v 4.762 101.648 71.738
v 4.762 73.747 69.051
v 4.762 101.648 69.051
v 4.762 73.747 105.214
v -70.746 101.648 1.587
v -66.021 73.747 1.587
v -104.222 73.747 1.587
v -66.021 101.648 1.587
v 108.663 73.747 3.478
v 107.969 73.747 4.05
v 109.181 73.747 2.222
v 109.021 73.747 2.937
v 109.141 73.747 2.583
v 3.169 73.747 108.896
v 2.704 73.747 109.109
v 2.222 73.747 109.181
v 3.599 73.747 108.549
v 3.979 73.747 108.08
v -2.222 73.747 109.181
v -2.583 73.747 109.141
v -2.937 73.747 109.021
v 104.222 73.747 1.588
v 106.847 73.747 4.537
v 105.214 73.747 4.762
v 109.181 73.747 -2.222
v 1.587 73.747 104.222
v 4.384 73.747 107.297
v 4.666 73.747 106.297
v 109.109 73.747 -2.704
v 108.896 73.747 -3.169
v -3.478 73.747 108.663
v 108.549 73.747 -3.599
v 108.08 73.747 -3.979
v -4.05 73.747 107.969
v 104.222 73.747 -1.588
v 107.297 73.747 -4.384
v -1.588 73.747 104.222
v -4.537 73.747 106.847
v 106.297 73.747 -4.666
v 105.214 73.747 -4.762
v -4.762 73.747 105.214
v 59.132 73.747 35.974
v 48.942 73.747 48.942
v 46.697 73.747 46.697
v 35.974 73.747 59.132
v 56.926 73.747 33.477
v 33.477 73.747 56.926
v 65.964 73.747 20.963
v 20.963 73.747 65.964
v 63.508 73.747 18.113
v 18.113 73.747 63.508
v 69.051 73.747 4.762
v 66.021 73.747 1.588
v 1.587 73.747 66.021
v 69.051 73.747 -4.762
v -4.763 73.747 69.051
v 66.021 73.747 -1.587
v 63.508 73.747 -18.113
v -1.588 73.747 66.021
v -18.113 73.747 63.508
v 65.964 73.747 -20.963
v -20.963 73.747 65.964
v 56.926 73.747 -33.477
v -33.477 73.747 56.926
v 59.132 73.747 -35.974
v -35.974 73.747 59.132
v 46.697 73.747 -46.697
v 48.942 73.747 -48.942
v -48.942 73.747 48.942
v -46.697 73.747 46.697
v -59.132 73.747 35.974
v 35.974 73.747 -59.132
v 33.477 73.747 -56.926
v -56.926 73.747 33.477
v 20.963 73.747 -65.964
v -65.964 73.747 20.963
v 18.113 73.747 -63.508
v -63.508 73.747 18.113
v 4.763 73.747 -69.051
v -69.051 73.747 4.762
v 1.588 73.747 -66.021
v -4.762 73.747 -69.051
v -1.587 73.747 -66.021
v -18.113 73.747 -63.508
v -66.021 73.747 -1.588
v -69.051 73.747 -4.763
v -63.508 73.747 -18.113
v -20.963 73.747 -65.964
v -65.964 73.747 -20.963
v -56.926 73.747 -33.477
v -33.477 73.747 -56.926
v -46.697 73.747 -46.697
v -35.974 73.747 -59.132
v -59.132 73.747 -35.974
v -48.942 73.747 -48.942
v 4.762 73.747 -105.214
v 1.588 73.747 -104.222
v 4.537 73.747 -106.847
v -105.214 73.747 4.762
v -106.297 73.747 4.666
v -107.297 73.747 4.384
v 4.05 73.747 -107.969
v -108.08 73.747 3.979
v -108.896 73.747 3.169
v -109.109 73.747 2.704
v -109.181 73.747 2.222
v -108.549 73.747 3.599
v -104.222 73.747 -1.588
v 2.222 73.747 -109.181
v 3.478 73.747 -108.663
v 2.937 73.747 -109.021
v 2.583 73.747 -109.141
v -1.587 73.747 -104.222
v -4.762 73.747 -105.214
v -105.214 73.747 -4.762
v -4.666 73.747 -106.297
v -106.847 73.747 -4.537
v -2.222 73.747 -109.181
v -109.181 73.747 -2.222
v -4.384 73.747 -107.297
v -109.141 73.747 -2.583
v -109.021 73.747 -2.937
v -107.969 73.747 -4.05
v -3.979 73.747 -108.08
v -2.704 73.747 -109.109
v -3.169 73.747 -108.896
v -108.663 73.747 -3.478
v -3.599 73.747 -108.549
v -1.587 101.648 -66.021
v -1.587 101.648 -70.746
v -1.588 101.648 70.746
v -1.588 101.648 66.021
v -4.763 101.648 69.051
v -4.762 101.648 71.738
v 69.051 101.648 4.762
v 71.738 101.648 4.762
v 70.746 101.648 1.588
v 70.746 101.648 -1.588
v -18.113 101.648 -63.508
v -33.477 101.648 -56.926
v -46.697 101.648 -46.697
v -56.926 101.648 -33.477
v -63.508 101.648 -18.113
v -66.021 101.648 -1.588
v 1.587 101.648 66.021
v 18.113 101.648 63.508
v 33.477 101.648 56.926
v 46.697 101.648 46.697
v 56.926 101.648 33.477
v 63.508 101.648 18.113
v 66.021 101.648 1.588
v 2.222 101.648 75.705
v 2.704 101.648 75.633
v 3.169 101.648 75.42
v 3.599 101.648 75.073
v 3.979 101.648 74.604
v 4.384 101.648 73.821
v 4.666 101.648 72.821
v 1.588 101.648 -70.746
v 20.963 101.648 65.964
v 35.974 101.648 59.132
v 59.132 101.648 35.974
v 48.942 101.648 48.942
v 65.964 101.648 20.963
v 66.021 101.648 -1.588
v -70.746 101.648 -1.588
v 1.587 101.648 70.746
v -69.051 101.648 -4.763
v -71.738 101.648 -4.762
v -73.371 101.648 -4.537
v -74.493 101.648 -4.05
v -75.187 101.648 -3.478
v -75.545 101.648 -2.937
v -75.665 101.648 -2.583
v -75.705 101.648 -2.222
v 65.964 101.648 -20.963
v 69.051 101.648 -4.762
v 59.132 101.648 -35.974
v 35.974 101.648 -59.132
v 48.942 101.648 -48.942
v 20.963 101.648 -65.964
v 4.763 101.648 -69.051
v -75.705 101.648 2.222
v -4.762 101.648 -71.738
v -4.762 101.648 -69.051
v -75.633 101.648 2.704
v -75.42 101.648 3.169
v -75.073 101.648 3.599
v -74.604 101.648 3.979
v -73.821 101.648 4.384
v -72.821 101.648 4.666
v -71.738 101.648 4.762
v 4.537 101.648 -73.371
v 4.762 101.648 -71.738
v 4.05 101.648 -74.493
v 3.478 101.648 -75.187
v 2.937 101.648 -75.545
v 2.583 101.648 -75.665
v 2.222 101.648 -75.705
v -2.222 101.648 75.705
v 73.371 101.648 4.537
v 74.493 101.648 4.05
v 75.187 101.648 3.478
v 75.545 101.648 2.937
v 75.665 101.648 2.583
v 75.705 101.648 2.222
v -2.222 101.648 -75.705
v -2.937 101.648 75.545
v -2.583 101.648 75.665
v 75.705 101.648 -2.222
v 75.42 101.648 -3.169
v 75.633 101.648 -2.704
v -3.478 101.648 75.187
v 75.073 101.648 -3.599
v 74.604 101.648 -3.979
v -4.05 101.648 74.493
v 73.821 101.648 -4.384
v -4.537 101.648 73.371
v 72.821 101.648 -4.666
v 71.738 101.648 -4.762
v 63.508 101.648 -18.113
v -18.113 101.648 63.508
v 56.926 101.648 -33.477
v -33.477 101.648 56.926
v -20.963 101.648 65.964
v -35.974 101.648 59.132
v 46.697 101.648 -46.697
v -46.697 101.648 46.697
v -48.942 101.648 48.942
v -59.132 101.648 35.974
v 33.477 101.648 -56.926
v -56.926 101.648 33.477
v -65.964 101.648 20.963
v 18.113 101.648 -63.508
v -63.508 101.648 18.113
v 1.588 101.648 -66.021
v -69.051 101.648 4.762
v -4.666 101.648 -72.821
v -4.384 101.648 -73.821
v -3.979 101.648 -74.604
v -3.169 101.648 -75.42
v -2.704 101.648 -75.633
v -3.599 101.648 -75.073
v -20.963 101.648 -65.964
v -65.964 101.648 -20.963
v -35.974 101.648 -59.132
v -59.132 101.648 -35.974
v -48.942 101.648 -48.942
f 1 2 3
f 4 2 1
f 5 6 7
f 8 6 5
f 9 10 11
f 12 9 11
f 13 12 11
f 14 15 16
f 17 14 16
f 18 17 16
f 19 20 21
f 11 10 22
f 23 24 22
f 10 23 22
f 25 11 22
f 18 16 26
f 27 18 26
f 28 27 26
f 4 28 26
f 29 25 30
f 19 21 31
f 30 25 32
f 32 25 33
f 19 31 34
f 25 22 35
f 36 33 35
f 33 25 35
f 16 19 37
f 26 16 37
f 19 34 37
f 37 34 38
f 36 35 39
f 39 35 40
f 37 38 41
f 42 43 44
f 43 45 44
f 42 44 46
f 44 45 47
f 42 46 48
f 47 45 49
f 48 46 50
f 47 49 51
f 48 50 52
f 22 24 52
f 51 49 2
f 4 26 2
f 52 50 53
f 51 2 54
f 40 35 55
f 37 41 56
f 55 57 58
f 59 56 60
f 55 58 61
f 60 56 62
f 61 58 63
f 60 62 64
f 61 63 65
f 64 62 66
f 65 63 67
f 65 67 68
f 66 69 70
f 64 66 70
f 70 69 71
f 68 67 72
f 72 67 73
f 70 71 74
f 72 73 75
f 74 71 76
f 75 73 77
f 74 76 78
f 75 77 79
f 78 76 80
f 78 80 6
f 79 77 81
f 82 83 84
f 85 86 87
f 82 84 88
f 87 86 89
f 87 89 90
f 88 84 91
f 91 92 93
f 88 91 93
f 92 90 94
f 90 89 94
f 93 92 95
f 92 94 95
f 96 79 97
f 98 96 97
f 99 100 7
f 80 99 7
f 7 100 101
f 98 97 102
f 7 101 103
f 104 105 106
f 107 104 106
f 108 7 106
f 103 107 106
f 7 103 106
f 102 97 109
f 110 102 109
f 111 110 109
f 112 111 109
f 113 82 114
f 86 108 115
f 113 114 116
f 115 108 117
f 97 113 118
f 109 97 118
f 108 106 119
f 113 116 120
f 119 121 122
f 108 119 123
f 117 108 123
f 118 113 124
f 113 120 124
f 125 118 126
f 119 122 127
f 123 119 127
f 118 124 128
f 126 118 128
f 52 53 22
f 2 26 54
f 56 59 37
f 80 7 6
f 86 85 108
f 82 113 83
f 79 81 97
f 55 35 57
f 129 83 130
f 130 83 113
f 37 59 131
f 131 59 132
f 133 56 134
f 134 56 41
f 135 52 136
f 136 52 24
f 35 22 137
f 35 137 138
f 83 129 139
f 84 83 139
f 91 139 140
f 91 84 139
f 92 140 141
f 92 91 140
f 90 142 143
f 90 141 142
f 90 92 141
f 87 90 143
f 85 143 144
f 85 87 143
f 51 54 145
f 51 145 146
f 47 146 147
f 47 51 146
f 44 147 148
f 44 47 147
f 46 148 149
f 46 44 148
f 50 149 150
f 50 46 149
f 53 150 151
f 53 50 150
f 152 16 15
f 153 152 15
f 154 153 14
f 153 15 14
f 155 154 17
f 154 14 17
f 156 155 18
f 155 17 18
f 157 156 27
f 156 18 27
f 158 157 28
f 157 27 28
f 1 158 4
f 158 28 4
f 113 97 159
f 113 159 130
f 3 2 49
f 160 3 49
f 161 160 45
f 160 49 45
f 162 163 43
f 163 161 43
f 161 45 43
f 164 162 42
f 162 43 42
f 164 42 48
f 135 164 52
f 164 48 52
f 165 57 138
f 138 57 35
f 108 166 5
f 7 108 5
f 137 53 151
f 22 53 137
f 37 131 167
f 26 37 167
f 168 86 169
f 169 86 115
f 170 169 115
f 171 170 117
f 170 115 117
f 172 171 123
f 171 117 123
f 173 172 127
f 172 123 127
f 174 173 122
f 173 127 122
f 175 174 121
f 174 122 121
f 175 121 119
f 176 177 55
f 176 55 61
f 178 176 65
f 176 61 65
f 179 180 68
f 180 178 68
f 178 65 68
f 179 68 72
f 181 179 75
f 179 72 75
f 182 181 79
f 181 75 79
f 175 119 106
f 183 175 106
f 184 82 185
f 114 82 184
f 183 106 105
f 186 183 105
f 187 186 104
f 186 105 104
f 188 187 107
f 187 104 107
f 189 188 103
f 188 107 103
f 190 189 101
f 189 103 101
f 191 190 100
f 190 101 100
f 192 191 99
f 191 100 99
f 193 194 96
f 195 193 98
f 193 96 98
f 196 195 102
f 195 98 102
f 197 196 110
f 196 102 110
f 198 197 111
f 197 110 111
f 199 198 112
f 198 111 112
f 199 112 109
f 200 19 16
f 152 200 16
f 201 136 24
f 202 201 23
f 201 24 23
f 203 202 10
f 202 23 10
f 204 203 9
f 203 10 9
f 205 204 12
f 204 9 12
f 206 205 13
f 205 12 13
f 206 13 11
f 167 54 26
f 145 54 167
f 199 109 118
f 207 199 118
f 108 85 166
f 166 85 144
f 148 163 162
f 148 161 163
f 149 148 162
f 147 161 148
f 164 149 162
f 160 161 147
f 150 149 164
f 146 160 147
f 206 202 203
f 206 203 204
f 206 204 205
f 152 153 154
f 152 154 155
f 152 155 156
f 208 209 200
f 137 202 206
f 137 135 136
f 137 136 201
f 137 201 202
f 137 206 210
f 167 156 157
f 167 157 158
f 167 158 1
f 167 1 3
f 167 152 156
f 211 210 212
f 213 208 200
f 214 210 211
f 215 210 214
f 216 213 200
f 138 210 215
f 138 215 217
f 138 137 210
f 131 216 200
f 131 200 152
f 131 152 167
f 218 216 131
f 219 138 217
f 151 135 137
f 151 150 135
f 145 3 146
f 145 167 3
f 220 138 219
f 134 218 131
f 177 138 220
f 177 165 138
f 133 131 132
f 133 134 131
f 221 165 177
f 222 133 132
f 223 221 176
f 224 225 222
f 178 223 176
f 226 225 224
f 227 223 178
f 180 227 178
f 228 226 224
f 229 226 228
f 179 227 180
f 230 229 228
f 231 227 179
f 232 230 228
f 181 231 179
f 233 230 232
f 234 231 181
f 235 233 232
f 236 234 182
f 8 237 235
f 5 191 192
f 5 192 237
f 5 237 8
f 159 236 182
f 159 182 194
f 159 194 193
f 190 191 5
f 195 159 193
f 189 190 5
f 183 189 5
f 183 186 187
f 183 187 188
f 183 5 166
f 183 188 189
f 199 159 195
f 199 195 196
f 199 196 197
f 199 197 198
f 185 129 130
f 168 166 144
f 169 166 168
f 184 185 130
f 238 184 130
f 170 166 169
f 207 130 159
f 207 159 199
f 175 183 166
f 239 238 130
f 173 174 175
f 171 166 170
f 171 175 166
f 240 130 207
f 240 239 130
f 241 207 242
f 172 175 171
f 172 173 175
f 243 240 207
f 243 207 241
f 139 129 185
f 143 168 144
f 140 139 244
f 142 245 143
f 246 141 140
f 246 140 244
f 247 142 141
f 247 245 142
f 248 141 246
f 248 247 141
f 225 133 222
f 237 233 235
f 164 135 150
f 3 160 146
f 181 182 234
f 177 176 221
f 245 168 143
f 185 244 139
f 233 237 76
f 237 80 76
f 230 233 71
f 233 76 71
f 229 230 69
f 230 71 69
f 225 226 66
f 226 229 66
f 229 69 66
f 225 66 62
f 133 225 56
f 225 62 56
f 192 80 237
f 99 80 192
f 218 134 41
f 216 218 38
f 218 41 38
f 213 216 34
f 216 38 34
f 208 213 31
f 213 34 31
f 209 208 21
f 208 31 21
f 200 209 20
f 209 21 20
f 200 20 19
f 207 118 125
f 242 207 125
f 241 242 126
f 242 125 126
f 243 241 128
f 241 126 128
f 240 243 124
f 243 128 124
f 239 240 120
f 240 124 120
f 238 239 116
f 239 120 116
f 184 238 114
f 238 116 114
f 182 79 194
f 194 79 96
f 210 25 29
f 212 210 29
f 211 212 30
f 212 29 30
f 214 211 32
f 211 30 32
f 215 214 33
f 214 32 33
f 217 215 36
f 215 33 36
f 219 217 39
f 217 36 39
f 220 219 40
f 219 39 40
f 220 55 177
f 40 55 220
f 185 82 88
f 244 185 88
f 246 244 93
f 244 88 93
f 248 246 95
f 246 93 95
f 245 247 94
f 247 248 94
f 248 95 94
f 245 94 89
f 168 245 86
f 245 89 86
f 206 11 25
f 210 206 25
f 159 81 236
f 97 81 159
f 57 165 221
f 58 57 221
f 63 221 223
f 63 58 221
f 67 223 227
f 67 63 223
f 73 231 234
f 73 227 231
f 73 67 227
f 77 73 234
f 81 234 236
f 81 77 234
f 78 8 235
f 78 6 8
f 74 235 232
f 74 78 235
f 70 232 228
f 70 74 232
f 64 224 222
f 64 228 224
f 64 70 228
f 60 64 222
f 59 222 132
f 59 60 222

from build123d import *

# Parameters (mm, degrees)
SKETCH4_R                      = 69.215
SKETCH4_R_2                    = 66.04
BOSS_EXTRUDE3_DEPTH            = 114.3
CUT_EXTRUDE3_REACH             = 152.486
CUT_EXTRUDE3_END_RADIUS        = 69.215
SKETCH11_W                     = 3.175
SKETCH11_H                     = 203.2
CUT_EXTRUDE3_DIRECTION_2_DEPTH = 151.485622071
CUT_EXTRUDE4_REACH             = 152.486
CUT_EXTRUDE4_END_RADIUS        = 69.215
SKETCH12_W                     = 3.175
SKETCH12_H                     = 203.2
CUT_EXTRUDE5_REACH             = 152.486
CUT_EXTRUDE5_END_RADIUS        = 69.215
SKETCH13_W                     = 3.175
SKETCH13_H                     = 203.2
BOSS_EXTRUDE4_REACH            = 184.577
BOSS_EXTRUDE4_END_RADIUS       = 69.215
SKETCH17_W                     = 9.525
SKETCH17_H                     = 62.726737768
CUT_EXTRUDE6_REACH             = 184.577
CUT_EXTRUDE6_END_RADIUS        = 66.04
SKETCH19_W                     = 3.175
SKETCH19_H                     = 59.551737768
CIRPATTERN1_COUNT              = 4
FILLET2_R                      = 2.54
CUT_EXTRUDE9_DEPTH             = 193.329009636
CUT_EXTRUDE9_DEPTH_BACK        = 193.329009636
SKETCH21_W                     = 275.590003483
SKETCH21_H                     = 18.263028837
SKETCH21_H_2                   = 74.818808086


with BuildPart() as part:
    # Sketch4 → Boss-Extrude3 (new body)
    with BuildSketch(Plane(origin=(0, 0, 0), x_dir=(1, 0, 0), z_dir=(0, 1, 0))):
        with Locations(Location((0, 0, 0), (0, 0, 270))):
            Circle(SKETCH4_R)
        with Locations(Location((0, 0, 0), (0, 0, 270))):
            Circle(SKETCH4_R_2, mode=Mode.SUBTRACT)
    extrude(amount=BOSS_EXTRUDE3_DEPTH)

    # Cut-Extrude3: up to this cylinder (the profile starts inside it)
    cut_extrude3_end = Plane(origin=(0, 0, 0), z_dir=(0, -1, 0)) * Cylinder(CUT_EXTRUDE3_END_RADIUS, 444.402, mode=Mode.PRIVATE)
    # Sketch11 → Cut-Extrude3 (cut, up to the surface)
    with BuildSketch(Plane.XY, mode=Mode.PRIVATE) as cut_extrude3_sk1:
        Rectangle(SKETCH11_W, SKETCH11_H)
    cut_extrude3_tool1 = extrude(cut_extrude3_sk1.sketch, amount=-CUT_EXTRUDE3_REACH, mode=Mode.PRIVATE) & cut_extrude3_end
    add(cut_extrude3_tool1.solids().sort_by_distance((0, 0, 0))[0], mode=Mode.SUBTRACT)

    # Sketch11 → Cut-Extrude3 direction 2 (cut)
    with BuildSketch(Plane.XY):
        Rectangle(SKETCH11_W, SKETCH11_H)
    extrude(amount=CUT_EXTRUDE3_DIRECTION_2_DEPTH, mode=Mode.SUBTRACT)

    # Cut-Extrude4: up to this cylinder (the profile starts inside it)
    cut_extrude4_end = Plane(origin=(0, 0, 0), z_dir=(0, -1, 0)) * Cylinder(CUT_EXTRUDE4_END_RADIUS, 444.402, mode=Mode.PRIVATE)
    # Sketch12 → Cut-Extrude4 (cut, up to the surface)
    with BuildSketch(Plane(origin=(0, 0, 0), x_dir=(0, 0, -1), z_dir=(1, 0, 0)), mode=Mode.PRIVATE) as cut_extrude4_sk1:
        Rectangle(SKETCH12_W, SKETCH12_H)
    cut_extrude4_tool1 = extrude(cut_extrude4_sk1.sketch, amount=-CUT_EXTRUDE4_REACH, mode=Mode.PRIVATE) & cut_extrude4_end
    add(cut_extrude4_tool1.solids().sort_by_distance((0, 0, 0))[0], mode=Mode.SUBTRACT)

    # Cut-Extrude5: up to this cylinder (the profile starts inside it)
    cut_extrude5_end = Plane(origin=(0, 0, 0), z_dir=(0, -1, 0)) * Cylinder(CUT_EXTRUDE5_END_RADIUS, 444.402, mode=Mode.PRIVATE)
    # Sketch13 → Cut-Extrude5 (cut, up to the surface)
    with BuildSketch(Plane(origin=(0, 0, 0), x_dir=(0, 0, -1), z_dir=(1, 0, 0)), mode=Mode.PRIVATE) as cut_extrude5_sk1:
        Rectangle(SKETCH13_W, SKETCH13_H)
    cut_extrude5_tool1 = extrude(cut_extrude5_sk1.sketch, amount=CUT_EXTRUDE5_REACH, mode=Mode.PRIVATE) & cut_extrude5_end
    add(cut_extrude5_tool1.solids().sort_by_distance((0, 0, 0))[0], mode=Mode.SUBTRACT)

    # Boss-Extrude4: up to this cylinder (the profile starts outside it)
    boss_extrude4_end = Plane(origin=(0, 49.492455, 0), z_dir=(0, -1, 0)) * Cylinder(BOSS_EXTRUDE4_END_RADIUS, 508.584, mode=Mode.PRIVATE)
    # Sketch17 → Boss-Extrude4 (add, up to the surface)
    with BuildSketch(Plane(origin=(28.35077692, -23.629361026, 0), x_dir=(0, 0, -1), z_dir=(0.7681717916741627, -0.6402437805056029, 0)), mode=Mode.PRIVATE) as boss_extrude4_sk1:
        with Locations((0, 95.18940566)):
            Rectangle(SKETCH17_W, SKETCH17_H)
    boss_extrude4_tool1 = extrude(boss_extrude4_sk1.sketch, amount=-BOSS_EXTRUDE4_REACH, mode=Mode.PRIVATE) - boss_extrude4_end
    boss_extrude4 = boss_extrude4_tool1.solids().sort_by_distance((89.295202, 49.492455, 0))[0]
    add(boss_extrude4)

    # Cut-Extrude6: up to this cylinder (the profile starts outside it)
    cut_extrude6_end = Plane(origin=(0, 48.272983, 0), z_dir=(0, -1, 0)) * Cylinder(CUT_EXTRUDE6_END_RADIUS, 502.234, mode=Mode.PRIVATE)
    # Sketch19 → Cut-Extrude6 (cut, up to the surface)
    with BuildSketch(Plane(origin=(28.35077692, -23.629361026, 0), x_dir=(0, 0, -1), z_dir=(0.7681717916741628, -0.640243780505603, 0)), mode=Mode.PRIVATE) as cut_extrude6_sk1:
        with Locations((0, 93.60190566)):
            Rectangle(SKETCH19_W, SKETCH19_H)
    cut_extrude6_tool1 = extrude(cut_extrude6_sk1.sketch, amount=-CUT_EXTRUDE6_REACH, mode=Mode.PRIVATE) - cut_extrude6_end
    cut_extrude6 = cut_extrude6_tool1.solids().sort_by_distance((88.278815, 48.272983, 0))[0]
    add(cut_extrude6, mode=Mode.SUBTRACT)

    # CirPattern1: Boss-Extrude4, Cut-Extrude6 ×4 about axis
    cirpattern1_axis = Axis((0, 0, 0), (0, 1, 0))
    add([boss_extrude4.rotate(cirpattern1_axis, i * 360 / CIRPATTERN1_COUNT) for i in range(1, CIRPATTERN1_COUNT)])
    add([cut_extrude6.rotate(cirpattern1_axis, i * 360 / CIRPATTERN1_COUNT) for i in range(1, CIRPATTERN1_COUNT)], mode=Mode.SUBTRACT)

    # Fillet2
    # the kernel refuses this fillet: 2.54 mm, written as the material it takes off along each edge
    with BuildSketch(Plane(origin=(4.7625, 20.522109123, -65.149451994), x_dir=(-1, 0, 0), z_dir=(0, 0.7681717916741628, -0.640243780505603))) as fillet2_piece_1_section:
        with BuildLine():
            CenterArc((FILLET2_R, FILLET2_R), FILLET2_R, 180, 90)
            Line((0, FILLET2_R), (0, 0))
            Line((0, 0), (FILLET2_R, 0))
        make_face()
    fillet2_piece_1 = extrude(amount=75.426737768, mode=Mode.PRIVATE)
    fillet2_piece_1 = fillet2_piece_1 - Plane(origin=(0, 52.481761508, 0), x_dir=(0, 0, 1), z_dir=(0, -1, 0)) * Cylinder(69.215, 162, mode=Mode.PRIVATE)
    add(fillet2_piece_1, mode=Mode.SUBTRACT)
    with BuildSketch(Plane(origin=(4.7625, 69.519362531, -114.253294604), x_dir=(0, -0.7681717916741627, 0.640243780505603), z_dir=(0, 0.640243780505603, 0.7681717916741628))) as fillet2_piece_2_section:
        with BuildLine():
            CenterArc((FILLET2_R, -FILLET2_R), FILLET2_R, 90, 90)
            Line((0, -FILLET2_R), (0, 0))
            Line((0, 0), (FILLET2_R, 0))
        make_face()
    fillet2_piece_2 = extrude(amount=65.194046298, mode=Mode.PRIVATE)
    fillet2_piece_2 = fillet2_piece_2 - Plane(origin=(0, 87.751002434, 0), x_dir=(0, 0, 1), z_dir=(0, -1, 0)) * Cylinder(69.215, 141, mode=Mode.PRIVATE)
    add(fillet2_piece_2, mode=Mode.SUBTRACT)
    with BuildSketch(Plane(origin=(-4.7625, 78.462801414, -113.440951733), x_dir=(1, 0, 0), z_dir=(0, -0.7681717916741628, 0.640243780505603))) as fillet2_piece_3_section:
        with BuildLine():
            CenterArc((FILLET2_R, FILLET2_R), FILLET2_R, 180, 90)
            Line((0, FILLET2_R), (0, 0))
            Line((0, 0), (FILLET2_R, 0))
        make_face()
    fillet2_piece_3 = extrude(amount=75.426737768, mode=Mode.PRIVATE)
    fillet2_piece_3 = fillet2_piece_3 - Plane(origin=(0, 52.481717746, 0), x_dir=(0, 0, 1), z_dir=(0, -1, 0)) * Cylinder(69.215, 162, mode=Mode.PRIVATE)
    add(fillet2_piece_3, mode=Mode.SUBTRACT)
    with BuildSketch(Plane(origin=(-4.7625, 69.519362531, -114.253294604), x_dir=(1, 0, 0), z_dir=(0, 0.640243780505603, 0.7681717916741628))) as fillet2_piece_4_section:
        with BuildLine():
            CenterArc((FILLET2_R, -FILLET2_R), FILLET2_R, 90, 90)
            Line((0, -FILLET2_R), (0, 0))
            Line((0, 0), (FILLET2_R, 0))
        make_face()
    fillet2_piece_4 = extrude(amount=65.194046298, mode=Mode.PRIVATE)
    fillet2_piece_4 = fillet2_piece_4 - Plane(origin=(0, 87.75098251, 0), x_dir=(0, 0, 1), z_dir=(0, -1, 0)) * Cylinder(69.215, 141, mode=Mode.PRIVATE)
    add(fillet2_piece_4, mode=Mode.SUBTRACT)
    with BuildSketch(Plane(origin=(-113.440951733, 78.462801414, 4.7625), x_dir=(0.7681717916741627, 0.640243780505603, 0), z_dir=(0.640243780505603, -0.7681717916741628, 0))) as fillet2_piece_5_section:
        with BuildLine():
            CenterArc((FILLET2_R, -FILLET2_R), FILLET2_R, 90, 90)
            Line((0, -FILLET2_R), (0, 0))
            Line((0, 0), (FILLET2_R, 0))
        make_face()
    fillet2_piece_5 = extrude(amount=75.426737768, mode=Mode.PRIVATE)
    fillet2_piece_5 = fillet2_piece_5 - Plane(origin=(0, 52.481803849, 0), x_dir=(0, 0, 1), z_dir=(0, -1, 0)) * Cylinder(69.215, 162, mode=Mode.PRIVATE)
    add(fillet2_piece_5, mode=Mode.SUBTRACT)
    with BuildSketch(Plane(origin=(-65.149451994, 20.522109123, -4.7625), x_dir=(0.7681717916741627, 0.6402437805056029, 0), z_dir=(-0.640243780505603, 0.7681717916741628, 0))) as fillet2_piece_6_section:
        with BuildLine():
            CenterArc((FILLET2_R, -FILLET2_R), FILLET2_R, 90, 90)
            Line((0, -FILLET2_R), (0, 0))
            Line((0, 0), (FILLET2_R, 0))
        make_face()
    fillet2_piece_6 = extrude(amount=75.426737768, mode=Mode.PRIVATE)
    fillet2_piece_6 = fillet2_piece_6 - Plane(origin=(0, 52.481712427, 0), x_dir=(0, 0, 1), z_dir=(0, -1, 0)) * Cylinder(69.215, 162, mode=Mode.PRIVATE)
    add(fillet2_piece_6, mode=Mode.SUBTRACT)
    with BuildSketch(Plane(origin=(-114.253294604, 69.519362531, -4.7625), x_dir=(0.640243780505603, -0.7681717916741627, 0), z_dir=(0.7681717916741628, 0.640243780505603, 0))) as fillet2_piece_7_section:
        with BuildLine():
            CenterArc((FILLET2_R, -FILLET2_R), FILLET2_R, 90, 90)
            Line((0, -FILLET2_R), (0, 0))
            Line((0, 0), (FILLET2_R, 0))
        make_face()
    fillet2_piece_7 = extrude(amount=65.194046298, mode=Mode.PRIVATE)
    fillet2_piece_7 = fillet2_piece_7 - Plane(origin=(0, 87.75099738, 0), x_dir=(0, 0, 1), z_dir=(0, -1, 0)) * Cylinder(69.215, 141, mode=Mode.PRIVATE)
    add(fillet2_piece_7, mode=Mode.SUBTRACT)
    with BuildSketch(Plane(origin=(-114.253294604, 69.519362531, 4.7625), x_dir=(0, 0, -1), z_dir=(0.7681717916741628, 0.640243780505603, 0))) as fillet2_piece_8_section:
        with BuildLine():
            CenterArc((FILLET2_R, -FILLET2_R), FILLET2_R, 90, 90)
            Line((0, -FILLET2_R), (0, 0))
            Line((0, 0), (FILLET2_R, 0))
        make_face()
    fillet2_piece_8 = extrude(amount=65.194046298, mode=Mode.PRIVATE)
    fillet2_piece_8 = fillet2_piece_8 - Plane(origin=(0, 87.75098251, 0), x_dir=(0, 0, 1), z_dir=(0, -1, 0)) * Cylinder(69.215, 141, mode=Mode.PRIVATE)
    add(fillet2_piece_8, mode=Mode.SUBTRACT)
    with BuildSketch(Plane(origin=(4.7625, 78.462801414, 113.440951733), x_dir=(0, 0.640243780505603, -0.7681717916741628), z_dir=(0, -0.7681717916741628, -0.640243780505603))) as fillet2_piece_9_section:
        with BuildLine():
            CenterArc((FILLET2_R, -FILLET2_R), FILLET2_R, 90, 90)
            Line((0, -FILLET2_R), (0, 0))
            Line((0, 0), (FILLET2_R, 0))
        make_face()
    fillet2_piece_9 = extrude(amount=75.426737768, mode=Mode.PRIVATE)
    fillet2_piece_9 = fillet2_piece_9 - Plane(origin=(0, 52.48180385, 0), x_dir=(0, 0, 1), z_dir=(0, -1, 0)) * Cylinder(69.215, 162, mode=Mode.PRIVATE)
    add(fillet2_piece_9, mode=Mode.SUBTRACT)
    with BuildSketch(Plane(origin=(-4.7625, 20.522109123, 65.149451994), x_dir=(0, 0.640243780505603, -0.7681717916741628), z_dir=(0, 0.7681717916741628, 0.640243780505603))) as fillet2_piece_10_section:
        with BuildLine():
            CenterArc((FILLET2_R, -FILLET2_R), FILLET2_R, 90, 90)
            Line((0, -FILLET2_R), (0, 0))
            Line((0, 0), (FILLET2_R, 0))
        make_face()
    fillet2_piece_10 = extrude(amount=75.426737768, mode=Mode.PRIVATE)
    fillet2_piece_10 = fillet2_piece_10 - Plane(origin=(0, 52.481712427, 0), x_dir=(0, 0, 1), z_dir=(0, -1, 0)) * Cylinder(69.215, 162, mode=Mode.PRIVATE)
    add(fillet2_piece_10, mode=Mode.SUBTRACT)
    with BuildSketch(Plane(origin=(-4.7625, 69.519362531, 114.253294604), x_dir=(0, -0.7681717916741627, -0.640243780505603), z_dir=(0, 0.640243780505603, -0.7681717916741628))) as fillet2_piece_11_section:
        with BuildLine():
            CenterArc((FILLET2_R, -FILLET2_R), FILLET2_R, 90, 90)
            Line((0, -FILLET2_R), (0, 0))
            Line((0, 0), (FILLET2_R, 0))
        make_face()
    fillet2_piece_11 = extrude(amount=65.194046298, mode=Mode.PRIVATE)
    fillet2_piece_11 = fillet2_piece_11 - Plane(origin=(0, 87.750997379, 0), x_dir=(0, 0, 1), z_dir=(0, -1, 0)) * Cylinder(69.215, 141, mode=Mode.PRIVATE)
    add(fillet2_piece_11, mode=Mode.SUBTRACT)
    with BuildSketch(Plane(origin=(4.7625, 69.519362531, 114.253294604), x_dir=(-1, 0, 0), z_dir=(0, 0.640243780505603, -0.7681717916741628))) as fillet2_piece_12_section:
        with BuildLine():
            CenterArc((FILLET2_R, -FILLET2_R), FILLET2_R, 90, 90)
            Line((0, -FILLET2_R), (0, 0))
            Line((0, 0), (FILLET2_R, 0))
        make_face()
    fillet2_piece_12 = extrude(amount=65.194046298, mode=Mode.PRIVATE)
    fillet2_piece_12 = fillet2_piece_12 - Plane(origin=(0, 87.750982502, 0), x_dir=(0, 0, 1), z_dir=(0, -1, 0)) * Cylinder(69.215, 141, mode=Mode.PRIVATE)
    add(fillet2_piece_12, mode=Mode.SUBTRACT)
    with BuildSketch(Plane(origin=(114.253294604, 69.519362531, -4.7625), x_dir=(-0.6402437805056029, -0.7681717916741627, 0), z_dir=(-0.7681717916741628, 0.640243780505603, 0))) as fillet2_piece_13_section:
        with BuildLine():
            CenterArc((FILLET2_R, FILLET2_R), FILLET2_R, 180, 90)
            Line((0, FILLET2_R), (0, 0))
            Line((0, 0), (FILLET2_R, 0))
        make_face()
    fillet2_piece_13 = extrude(amount=65.194046298, mode=Mode.PRIVATE)
    fillet2_piece_13 = fillet2_piece_13 - Plane(origin=(0, 87.750998227, 0), x_dir=(0, 0, 1), z_dir=(0, -1, 0)) * Cylinder(69.215, 141, mode=Mode.PRIVATE)
    add(fillet2_piece_13, mode=Mode.SUBTRACT)
    with BuildSketch(Plane(origin=(114.253294604, 69.519362531, 4.7625), x_dir=(0, 0, -1), z_dir=(-0.7681717916741628, 0.640243780505603, 0))) as fillet2_piece_14_section:
        with BuildLine():
            CenterArc((FILLET2_R, FILLET2_R), FILLET2_R, 180, 90)
            Line((0, FILLET2_R), (0, 0))
            Line((0, 0), (FILLET2_R, 0))
        make_face()
    fillet2_piece_14 = extrude(amount=65.194046298, mode=Mode.PRIVATE)
    fillet2_piece_14 = fillet2_piece_14 - Plane(origin=(0, 87.7510067, 0), x_dir=(0, 0, 1), z_dir=(0, -1, 0)) * Cylinder(69.215, 141, mode=Mode.PRIVATE)
    add(fillet2_piece_14, mode=Mode.SUBTRACT)
    with BuildSketch(Plane(origin=(65.149451994, 20.522109123, 4.7625), x_dir=(-0.7681717916741627, 0.6402437805056029, 0), z_dir=(0.640243780505603, 0.7681717916741628, 0))) as fillet2_piece_15_section:
        with BuildLine():
            CenterArc((FILLET2_R, -FILLET2_R), FILLET2_R, 90, 90)
            Line((0, -FILLET2_R), (0, 0))
            Line((0, 0), (FILLET2_R, 0))
        make_face()
    fillet2_piece_15 = extrude(amount=75.426737768, mode=Mode.PRIVATE)
    fillet2_piece_15 = fillet2_piece_15 - Plane(origin=(0, 52.481781271, 0), x_dir=(0, 0, 1), z_dir=(0, -1, 0)) * Cylinder(69.215, 162, mode=Mode.PRIVATE)
    add(fillet2_piece_15, mode=Mode.SUBTRACT)
    with BuildSketch(Plane(origin=(113.440951733, 78.462801414, -4.7625), x_dir=(-0.7681717916741627, 0.640243780505603, 0), z_dir=(-0.640243780505603, -0.7681717916741628, 0))) as fillet2_piece_16_section:
        with BuildLine():
            CenterArc((FILLET2_R, -FILLET2_R), FILLET2_R, 90, 90)
            Line((0, -FILLET2_R), (0, 0))
            Line((0, 0), (FILLET2_R, 0))
        make_face()
    fillet2_piece_16 = extrude(amount=75.426737768, mode=Mode.PRIVATE)
    fillet2_piece_16 = fillet2_piece_16 - Plane(origin=(0, 52.481835587, 0), x_dir=(0, 0, 1), z_dir=(0, -1, 0)) * Cylinder(69.215, 162, mode=Mode.PRIVATE)
    add(fillet2_piece_16, mode=Mode.SUBTRACT)

    # Sketch21 → Cut-Extrude9 (cut, two sides: drawn at the far end of the back side and taken through both)
    with BuildSketch(Plane(origin=(0, 0, 0), x_dir=(0, 0, -1), z_dir=(1, 0, 0)).offset(-CUT_EXTRUDE9_DEPTH_BACK)):
        with Locations((2.764773941, 110.779336526)):
            Rectangle(SKETCH21_W, SKETCH21_H)
        with Locations((2.764773941, 36.337367755)):
            Rectangle(SKETCH21_W, SKETCH21_H_2)
    extrude(amount=CUT_EXTRUDE9_DEPTH + CUT_EXTRUDE9_DEPTH_BACK, mode=Mode.SUBTRACT)


solid = part.part
